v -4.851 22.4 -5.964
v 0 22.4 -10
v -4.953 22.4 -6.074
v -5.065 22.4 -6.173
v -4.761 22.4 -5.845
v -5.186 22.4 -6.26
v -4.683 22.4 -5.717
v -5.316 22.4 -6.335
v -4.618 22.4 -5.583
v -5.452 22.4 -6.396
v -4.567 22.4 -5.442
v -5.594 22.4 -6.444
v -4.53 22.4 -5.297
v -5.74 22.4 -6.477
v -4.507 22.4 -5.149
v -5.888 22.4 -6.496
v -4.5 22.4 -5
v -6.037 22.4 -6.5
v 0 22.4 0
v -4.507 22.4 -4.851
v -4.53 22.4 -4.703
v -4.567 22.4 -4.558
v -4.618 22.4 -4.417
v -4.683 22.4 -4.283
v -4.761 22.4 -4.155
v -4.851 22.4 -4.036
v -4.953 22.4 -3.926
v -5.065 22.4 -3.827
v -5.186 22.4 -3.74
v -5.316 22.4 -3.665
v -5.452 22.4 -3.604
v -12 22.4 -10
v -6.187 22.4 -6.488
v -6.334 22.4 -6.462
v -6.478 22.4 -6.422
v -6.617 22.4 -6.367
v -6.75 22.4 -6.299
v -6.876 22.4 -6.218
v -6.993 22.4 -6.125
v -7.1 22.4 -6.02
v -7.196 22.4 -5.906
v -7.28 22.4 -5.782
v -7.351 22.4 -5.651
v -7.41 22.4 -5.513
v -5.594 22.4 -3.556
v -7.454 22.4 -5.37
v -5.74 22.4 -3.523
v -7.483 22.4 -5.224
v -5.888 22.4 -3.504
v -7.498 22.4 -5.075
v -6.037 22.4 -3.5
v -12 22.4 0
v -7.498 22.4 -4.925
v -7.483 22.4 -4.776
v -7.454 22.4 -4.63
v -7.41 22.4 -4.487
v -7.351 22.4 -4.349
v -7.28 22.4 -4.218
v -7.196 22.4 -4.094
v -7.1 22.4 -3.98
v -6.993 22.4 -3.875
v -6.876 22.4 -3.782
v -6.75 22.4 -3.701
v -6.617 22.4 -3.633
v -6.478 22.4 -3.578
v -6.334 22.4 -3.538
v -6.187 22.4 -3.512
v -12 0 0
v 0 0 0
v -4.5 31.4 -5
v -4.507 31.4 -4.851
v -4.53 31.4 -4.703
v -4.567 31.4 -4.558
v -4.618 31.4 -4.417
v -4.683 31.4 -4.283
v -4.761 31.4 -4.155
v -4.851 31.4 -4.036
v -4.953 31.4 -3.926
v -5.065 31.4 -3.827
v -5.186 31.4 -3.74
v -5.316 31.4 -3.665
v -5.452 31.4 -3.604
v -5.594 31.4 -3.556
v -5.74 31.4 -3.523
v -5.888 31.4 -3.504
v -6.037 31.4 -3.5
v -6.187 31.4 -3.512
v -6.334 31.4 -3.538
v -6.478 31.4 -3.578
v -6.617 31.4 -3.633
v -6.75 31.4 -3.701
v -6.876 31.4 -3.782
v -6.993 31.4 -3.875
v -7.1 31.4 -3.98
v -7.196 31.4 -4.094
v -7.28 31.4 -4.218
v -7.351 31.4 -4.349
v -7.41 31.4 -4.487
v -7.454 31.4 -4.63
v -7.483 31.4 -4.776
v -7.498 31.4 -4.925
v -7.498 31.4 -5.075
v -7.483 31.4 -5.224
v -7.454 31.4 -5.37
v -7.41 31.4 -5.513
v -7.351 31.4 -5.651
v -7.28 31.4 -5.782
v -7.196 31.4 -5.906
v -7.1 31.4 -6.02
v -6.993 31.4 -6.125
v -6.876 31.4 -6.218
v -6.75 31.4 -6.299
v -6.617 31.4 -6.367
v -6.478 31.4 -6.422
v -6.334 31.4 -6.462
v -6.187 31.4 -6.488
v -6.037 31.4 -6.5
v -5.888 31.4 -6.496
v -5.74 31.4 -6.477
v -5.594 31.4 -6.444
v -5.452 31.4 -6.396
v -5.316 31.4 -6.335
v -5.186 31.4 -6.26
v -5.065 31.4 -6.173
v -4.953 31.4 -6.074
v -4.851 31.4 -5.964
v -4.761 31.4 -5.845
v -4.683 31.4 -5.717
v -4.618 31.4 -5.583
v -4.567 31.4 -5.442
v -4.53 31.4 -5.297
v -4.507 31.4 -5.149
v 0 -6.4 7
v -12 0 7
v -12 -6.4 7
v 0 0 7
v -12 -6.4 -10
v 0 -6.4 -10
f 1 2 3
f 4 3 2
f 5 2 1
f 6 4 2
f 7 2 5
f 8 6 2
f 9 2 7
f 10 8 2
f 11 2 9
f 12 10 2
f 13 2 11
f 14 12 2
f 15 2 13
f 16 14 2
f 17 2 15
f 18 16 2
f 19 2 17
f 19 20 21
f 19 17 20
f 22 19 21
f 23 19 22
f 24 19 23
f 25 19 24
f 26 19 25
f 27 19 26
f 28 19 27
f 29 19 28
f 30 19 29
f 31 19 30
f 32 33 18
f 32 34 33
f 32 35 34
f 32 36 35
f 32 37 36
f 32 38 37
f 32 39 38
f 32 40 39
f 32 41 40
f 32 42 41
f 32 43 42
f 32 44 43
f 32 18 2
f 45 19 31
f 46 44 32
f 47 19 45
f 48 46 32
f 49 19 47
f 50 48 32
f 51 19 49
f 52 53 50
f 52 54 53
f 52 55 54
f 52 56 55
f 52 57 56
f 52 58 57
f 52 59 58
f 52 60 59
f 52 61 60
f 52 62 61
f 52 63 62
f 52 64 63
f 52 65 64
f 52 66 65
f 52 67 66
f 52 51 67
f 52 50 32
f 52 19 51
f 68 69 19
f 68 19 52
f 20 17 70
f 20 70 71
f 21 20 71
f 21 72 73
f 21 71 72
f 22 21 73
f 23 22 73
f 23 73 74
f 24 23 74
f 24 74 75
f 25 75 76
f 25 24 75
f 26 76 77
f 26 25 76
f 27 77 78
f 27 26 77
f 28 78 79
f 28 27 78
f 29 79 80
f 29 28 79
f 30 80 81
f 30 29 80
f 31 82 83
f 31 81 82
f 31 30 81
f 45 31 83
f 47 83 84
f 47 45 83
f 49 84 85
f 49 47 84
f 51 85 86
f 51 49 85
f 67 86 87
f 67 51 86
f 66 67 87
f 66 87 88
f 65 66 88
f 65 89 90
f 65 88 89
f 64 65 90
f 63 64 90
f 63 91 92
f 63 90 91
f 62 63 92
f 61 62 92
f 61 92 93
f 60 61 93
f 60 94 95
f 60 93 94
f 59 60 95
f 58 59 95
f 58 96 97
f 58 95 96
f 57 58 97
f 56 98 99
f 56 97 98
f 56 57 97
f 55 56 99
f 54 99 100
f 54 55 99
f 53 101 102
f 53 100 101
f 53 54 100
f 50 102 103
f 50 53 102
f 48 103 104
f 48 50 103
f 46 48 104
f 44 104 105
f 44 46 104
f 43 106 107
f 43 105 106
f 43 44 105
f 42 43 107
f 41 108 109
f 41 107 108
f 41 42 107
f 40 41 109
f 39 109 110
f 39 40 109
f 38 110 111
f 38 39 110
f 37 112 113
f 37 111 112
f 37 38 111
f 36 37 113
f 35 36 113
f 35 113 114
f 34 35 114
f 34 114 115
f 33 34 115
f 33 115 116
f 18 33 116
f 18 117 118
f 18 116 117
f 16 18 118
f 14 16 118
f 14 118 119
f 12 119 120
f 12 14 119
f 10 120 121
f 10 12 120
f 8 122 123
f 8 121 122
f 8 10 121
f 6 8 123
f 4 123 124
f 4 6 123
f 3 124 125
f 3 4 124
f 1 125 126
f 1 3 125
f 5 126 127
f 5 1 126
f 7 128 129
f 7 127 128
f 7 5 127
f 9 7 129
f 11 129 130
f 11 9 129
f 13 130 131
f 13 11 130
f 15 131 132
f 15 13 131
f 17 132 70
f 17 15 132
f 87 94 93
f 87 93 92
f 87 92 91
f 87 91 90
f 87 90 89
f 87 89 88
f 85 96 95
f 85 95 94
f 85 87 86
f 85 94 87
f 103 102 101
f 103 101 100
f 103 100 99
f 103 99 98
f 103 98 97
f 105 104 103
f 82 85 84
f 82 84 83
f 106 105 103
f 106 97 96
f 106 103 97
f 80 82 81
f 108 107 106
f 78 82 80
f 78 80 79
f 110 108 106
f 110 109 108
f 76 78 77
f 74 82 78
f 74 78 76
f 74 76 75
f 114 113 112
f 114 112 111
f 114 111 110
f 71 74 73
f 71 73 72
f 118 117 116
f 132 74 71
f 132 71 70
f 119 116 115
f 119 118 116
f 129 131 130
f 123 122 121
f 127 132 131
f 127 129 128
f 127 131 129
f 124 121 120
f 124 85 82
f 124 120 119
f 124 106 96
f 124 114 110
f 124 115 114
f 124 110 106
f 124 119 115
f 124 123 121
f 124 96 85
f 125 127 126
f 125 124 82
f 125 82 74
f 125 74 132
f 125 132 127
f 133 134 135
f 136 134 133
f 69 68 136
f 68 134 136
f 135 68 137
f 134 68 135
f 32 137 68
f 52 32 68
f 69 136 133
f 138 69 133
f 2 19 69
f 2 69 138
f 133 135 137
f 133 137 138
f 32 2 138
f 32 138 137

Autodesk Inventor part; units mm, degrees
ref_plane "YZ Plane" through (0, 0, 0) normal (1, 0, 0) x (0, 1, 0)
ref_plane "XZ Plane" through (0, 0, 0) normal (0, 1, 0) x (-1, 0, 0)
ref_plane "XY Plane" through (0, 0, 0) normal (0, 0, 1) x (1, 0, 0)
sketch "Esquisse1" plane through (0, 0, 0) normal (0, 1, 0) x (-1, 0, 0)
  line L0 (0, 0) -> (12, 0)
  line L1 (12, 0) -> (12, -10)
  line L2 (12, -10) -> (0, -10)
  line L3 (0, -10) -> (0, 0)
  dimension "d0" = 10
  dimension "d1" = 12
extrude "Extrusion1" add sketch "Esquisse1" along normal blind 22.4
sketch "Esquisse2" plane through (0, 22.4, 0) normal (0, 1, 0) x (1, 0, 0)
  line L0 (-12, 0) -> (0, 0) construction
  line L1 (0, 0) -> (0, 10) construction
  line L2 (0, 10) -> (-12, 10) construction
  line L3 (-12, 10) -> (-12, 0) construction
  line L4 (-12, 5) -> (0, 5) construction
  line L5 (0, 0) -> (0, 10) construction
  circle A0 centre (-6, 5) radius 1.5
  dimension "d4" = 3
extrude "Extrusion2" add sketch "Esquisse2" along normal blind 9
sketch "Esquisse3" plane through (0, 0, 0) normal (0, -1, 0) x (1, 0, 0)
  line L0 (0, 0) -> (-12, 0) construction
  line L1 (-12, 0) -> (-12, -10) construction
  line L2 (-12, -10) -> (0, -10) construction
  line L3 (0, -10) -> (0, 0) construction
  line L4 (0, -10) -> (-12, -10)
  line L5 (-12, -10) -> (-12, 7)
  line L6 (-12, 7) -> (0, 7)
  line L7 (0, 7) -> (0, -10)
  line L8 (-12, 0) -> (-12, -10) projected
  dimension "d7" = 17
extrude "Extrusion3" add sketch "Esquisse3" along normal blind 6.4
properties part number "motor"
